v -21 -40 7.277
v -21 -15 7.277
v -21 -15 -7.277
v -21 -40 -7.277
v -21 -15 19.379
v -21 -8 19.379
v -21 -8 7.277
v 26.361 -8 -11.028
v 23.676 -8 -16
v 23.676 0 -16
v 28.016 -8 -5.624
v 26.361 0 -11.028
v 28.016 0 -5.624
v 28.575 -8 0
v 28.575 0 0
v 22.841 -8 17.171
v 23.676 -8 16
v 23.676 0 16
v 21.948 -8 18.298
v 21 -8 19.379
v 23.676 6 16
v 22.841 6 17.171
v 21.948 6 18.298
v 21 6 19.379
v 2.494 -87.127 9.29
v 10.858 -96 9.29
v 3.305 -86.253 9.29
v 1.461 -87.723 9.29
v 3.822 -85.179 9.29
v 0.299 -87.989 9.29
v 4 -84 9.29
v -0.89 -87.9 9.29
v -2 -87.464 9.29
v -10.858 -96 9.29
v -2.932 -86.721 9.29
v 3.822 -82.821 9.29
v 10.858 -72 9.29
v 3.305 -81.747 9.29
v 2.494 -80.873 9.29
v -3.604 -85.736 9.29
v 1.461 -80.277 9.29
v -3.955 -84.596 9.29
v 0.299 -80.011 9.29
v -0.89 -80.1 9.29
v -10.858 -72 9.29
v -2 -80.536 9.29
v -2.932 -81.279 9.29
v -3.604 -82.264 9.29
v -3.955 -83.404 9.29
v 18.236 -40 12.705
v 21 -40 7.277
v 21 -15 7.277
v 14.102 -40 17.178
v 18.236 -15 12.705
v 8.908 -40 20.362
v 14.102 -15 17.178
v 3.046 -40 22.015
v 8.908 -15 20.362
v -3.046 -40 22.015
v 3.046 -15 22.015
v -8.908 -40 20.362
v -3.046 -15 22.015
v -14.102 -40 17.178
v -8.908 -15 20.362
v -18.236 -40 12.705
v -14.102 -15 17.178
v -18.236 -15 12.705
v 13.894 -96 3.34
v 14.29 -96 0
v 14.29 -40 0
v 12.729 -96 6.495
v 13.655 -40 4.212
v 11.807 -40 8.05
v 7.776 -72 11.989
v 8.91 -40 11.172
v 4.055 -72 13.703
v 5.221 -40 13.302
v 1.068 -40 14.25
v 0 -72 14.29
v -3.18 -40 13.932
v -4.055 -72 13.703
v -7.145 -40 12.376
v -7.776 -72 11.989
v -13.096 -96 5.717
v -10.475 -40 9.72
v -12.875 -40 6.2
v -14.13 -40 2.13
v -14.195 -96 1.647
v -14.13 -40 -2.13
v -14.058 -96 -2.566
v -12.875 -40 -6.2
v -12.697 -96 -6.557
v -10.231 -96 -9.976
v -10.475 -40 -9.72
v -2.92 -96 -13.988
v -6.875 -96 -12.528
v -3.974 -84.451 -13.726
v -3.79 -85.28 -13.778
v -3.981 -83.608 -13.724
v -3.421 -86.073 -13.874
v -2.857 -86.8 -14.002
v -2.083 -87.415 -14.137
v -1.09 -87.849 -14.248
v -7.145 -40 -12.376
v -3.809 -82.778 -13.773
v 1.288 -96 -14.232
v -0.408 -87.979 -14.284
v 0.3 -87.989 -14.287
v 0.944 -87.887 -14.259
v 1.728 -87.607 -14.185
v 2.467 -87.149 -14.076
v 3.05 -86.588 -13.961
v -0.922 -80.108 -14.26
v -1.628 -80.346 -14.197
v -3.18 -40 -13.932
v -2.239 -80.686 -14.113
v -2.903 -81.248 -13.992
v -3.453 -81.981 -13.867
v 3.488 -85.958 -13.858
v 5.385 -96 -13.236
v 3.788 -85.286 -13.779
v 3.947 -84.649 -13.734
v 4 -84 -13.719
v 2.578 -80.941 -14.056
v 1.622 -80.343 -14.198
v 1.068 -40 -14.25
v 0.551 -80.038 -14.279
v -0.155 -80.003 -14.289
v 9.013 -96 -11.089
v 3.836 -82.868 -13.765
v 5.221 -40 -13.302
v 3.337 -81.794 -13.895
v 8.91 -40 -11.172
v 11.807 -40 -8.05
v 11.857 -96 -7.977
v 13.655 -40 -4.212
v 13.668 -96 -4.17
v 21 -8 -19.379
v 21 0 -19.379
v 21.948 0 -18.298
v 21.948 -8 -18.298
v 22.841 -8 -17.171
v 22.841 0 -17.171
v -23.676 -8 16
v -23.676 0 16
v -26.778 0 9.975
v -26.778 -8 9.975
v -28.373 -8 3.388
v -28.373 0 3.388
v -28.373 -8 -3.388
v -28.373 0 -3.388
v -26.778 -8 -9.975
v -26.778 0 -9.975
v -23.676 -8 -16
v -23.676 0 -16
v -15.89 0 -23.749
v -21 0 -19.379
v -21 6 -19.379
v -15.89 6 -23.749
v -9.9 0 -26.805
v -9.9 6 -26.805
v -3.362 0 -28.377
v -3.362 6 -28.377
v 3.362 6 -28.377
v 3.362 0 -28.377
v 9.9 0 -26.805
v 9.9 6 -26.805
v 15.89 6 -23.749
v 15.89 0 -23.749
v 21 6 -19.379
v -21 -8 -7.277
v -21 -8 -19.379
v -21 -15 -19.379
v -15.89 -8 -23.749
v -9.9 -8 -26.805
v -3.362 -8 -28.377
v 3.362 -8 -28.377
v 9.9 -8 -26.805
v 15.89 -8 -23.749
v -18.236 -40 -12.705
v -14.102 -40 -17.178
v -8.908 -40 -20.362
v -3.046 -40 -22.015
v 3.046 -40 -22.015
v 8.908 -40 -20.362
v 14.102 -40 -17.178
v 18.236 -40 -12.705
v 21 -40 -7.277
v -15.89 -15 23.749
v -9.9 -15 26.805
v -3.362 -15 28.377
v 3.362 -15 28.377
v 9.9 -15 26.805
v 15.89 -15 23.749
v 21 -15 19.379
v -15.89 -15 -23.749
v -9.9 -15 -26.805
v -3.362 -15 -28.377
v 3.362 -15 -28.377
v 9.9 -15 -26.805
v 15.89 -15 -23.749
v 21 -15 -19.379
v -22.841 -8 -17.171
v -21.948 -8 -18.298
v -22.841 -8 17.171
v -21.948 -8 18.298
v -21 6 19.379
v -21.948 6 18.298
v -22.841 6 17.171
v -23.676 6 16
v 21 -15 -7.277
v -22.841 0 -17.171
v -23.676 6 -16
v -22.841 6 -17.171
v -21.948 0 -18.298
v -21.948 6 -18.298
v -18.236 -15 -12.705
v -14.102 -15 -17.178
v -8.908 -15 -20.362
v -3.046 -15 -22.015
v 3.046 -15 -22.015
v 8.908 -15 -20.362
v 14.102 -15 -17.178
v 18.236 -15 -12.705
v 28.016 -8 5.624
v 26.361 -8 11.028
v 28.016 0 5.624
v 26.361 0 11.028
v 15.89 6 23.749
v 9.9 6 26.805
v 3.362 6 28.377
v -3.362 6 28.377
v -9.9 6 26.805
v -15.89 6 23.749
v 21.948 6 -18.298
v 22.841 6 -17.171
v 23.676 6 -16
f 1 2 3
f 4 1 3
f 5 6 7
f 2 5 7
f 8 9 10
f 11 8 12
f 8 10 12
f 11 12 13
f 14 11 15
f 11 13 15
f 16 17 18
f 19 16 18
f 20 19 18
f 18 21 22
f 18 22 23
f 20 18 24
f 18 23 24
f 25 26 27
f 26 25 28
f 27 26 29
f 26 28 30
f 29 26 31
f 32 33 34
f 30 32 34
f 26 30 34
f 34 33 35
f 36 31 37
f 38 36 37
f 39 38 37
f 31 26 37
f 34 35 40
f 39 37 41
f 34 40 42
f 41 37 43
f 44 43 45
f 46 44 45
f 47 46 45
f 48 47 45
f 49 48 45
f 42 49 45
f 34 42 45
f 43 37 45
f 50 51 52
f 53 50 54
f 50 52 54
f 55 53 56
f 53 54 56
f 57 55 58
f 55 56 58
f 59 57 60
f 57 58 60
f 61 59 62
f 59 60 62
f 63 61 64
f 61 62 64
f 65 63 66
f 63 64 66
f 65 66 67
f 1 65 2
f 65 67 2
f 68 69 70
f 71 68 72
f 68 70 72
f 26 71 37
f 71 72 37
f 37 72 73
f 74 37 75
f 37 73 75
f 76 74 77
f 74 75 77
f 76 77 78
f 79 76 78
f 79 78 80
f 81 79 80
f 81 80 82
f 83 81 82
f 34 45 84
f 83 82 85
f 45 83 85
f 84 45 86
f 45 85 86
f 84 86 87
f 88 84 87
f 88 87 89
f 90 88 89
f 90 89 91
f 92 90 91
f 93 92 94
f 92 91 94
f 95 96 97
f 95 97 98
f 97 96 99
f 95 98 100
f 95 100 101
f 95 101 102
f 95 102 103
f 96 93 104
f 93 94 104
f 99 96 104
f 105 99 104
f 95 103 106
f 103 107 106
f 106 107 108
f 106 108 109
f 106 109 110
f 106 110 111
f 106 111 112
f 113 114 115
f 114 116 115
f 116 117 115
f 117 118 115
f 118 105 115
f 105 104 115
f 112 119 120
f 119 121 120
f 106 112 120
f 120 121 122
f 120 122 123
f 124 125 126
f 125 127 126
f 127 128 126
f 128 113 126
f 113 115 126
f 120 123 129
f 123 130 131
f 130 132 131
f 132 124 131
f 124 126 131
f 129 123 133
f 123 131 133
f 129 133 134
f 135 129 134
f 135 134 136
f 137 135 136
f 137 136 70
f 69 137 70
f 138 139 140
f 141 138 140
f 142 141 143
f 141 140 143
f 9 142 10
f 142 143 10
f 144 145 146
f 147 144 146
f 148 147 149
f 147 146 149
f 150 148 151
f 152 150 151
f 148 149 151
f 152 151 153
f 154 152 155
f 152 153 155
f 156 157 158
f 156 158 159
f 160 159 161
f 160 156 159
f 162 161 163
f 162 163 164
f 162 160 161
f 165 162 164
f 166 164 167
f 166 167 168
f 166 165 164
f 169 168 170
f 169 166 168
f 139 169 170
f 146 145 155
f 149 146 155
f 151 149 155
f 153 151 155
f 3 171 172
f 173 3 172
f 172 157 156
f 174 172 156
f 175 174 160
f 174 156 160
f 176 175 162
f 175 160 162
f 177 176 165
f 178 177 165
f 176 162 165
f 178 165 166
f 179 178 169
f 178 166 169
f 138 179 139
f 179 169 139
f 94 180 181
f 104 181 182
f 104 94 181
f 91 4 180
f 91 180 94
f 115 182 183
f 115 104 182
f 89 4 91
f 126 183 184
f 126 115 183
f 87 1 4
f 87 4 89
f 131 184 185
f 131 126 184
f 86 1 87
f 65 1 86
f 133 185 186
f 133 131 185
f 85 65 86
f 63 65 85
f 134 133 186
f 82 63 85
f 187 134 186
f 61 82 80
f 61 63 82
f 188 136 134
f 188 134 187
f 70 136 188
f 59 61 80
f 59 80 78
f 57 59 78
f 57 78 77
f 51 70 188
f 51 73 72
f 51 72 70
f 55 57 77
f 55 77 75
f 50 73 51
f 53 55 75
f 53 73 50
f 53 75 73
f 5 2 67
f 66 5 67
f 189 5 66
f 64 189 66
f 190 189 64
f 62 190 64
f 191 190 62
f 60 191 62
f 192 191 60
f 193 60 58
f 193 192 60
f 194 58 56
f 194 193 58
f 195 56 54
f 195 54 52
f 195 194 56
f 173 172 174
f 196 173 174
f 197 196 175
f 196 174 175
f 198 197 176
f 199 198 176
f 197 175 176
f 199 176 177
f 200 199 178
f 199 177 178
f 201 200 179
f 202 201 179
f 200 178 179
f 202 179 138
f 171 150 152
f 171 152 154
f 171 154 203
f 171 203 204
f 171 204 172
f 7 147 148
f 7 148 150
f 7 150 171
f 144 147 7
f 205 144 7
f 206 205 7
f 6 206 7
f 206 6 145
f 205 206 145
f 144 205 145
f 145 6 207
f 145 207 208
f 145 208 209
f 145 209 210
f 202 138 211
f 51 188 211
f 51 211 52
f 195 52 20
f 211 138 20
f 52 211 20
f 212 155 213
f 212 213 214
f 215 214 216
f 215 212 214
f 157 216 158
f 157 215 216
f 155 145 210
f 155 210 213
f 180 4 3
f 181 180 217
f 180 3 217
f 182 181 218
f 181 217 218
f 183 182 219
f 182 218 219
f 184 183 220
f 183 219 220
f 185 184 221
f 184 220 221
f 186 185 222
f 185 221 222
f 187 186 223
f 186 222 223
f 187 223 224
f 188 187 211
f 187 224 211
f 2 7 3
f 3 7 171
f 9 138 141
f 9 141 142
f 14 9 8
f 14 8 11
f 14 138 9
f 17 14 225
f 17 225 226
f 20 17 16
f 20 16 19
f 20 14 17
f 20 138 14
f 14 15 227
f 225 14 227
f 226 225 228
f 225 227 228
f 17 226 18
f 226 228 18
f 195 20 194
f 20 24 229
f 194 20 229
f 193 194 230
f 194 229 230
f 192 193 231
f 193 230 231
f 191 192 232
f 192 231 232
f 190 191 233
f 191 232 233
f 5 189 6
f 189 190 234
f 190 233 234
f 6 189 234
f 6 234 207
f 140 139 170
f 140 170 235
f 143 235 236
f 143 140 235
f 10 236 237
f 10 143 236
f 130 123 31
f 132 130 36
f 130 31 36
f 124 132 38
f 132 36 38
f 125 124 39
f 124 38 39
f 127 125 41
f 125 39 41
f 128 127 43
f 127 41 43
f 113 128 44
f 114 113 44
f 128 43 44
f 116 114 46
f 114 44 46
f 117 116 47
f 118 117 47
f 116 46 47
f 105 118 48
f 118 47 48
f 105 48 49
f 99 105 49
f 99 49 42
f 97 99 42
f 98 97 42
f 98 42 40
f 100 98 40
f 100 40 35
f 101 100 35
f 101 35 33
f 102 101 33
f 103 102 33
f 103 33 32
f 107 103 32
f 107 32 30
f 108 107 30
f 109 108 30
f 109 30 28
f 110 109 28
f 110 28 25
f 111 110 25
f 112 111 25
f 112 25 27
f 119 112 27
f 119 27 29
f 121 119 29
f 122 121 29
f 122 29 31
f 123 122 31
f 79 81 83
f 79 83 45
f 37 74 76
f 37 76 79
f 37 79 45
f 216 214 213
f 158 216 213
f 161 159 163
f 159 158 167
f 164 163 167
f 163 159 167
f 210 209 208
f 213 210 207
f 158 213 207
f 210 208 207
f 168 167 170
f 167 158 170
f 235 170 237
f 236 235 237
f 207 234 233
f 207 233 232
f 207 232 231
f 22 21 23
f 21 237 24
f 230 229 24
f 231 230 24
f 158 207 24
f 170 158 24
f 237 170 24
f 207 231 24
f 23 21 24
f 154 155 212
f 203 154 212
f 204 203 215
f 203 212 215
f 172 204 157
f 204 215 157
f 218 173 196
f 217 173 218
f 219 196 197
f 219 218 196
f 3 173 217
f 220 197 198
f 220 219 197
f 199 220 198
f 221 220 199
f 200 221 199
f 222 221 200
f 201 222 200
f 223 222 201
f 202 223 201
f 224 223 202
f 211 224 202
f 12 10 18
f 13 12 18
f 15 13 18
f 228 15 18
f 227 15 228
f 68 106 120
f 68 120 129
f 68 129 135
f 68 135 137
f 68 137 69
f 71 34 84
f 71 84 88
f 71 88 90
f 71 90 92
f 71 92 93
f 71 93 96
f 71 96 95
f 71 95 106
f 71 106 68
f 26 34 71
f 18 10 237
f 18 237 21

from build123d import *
from build123d import SkipClean  # not in build123d's __all__

# Parameters (mm, degrees)
F1_DEPTH = 6
F2_DEPTH = 8
F3_DEPTH = 15
F4_DEPTH = 72
F5_DEPTH = 96
F6_DEPTH = 40
F7_R     = 4
F8_DEPTH = 25


# Not quite as in the source:
# - after a boolean that leaves OpenCascade's solid faulty, fix() repairs it


with BuildPart() as f1:
    # F0 (on Front) → F1 (new body)
    with BuildSketch(Plane.XZ):
        with BuildLine():
            Line((-21, 7.2767180102), (-21, 19.3786125664))
            ThreePointArc((-21, 19.3786125664), (-22.4015502975, 17.7398187497), (-23.6755279772, 16))
            Line((-23.6755279772, 16), (-23.6755279772, -16))
            ThreePointArc((-23.6755279772, -16), (-22.4015502975, -17.7398187497), (-21, -19.3786125664))
            Line((-21, -19.3786125664), (-21, -7.2767180102))
            ThreePointArc((-21, -7.2767180102), (-22.225, 0), (-21, 7.2767180102))
        make_face()
        with BuildLine():
            Line((-21, -7.2767180102), (-21, 7.2767180102))
            ThreePointArc((-21, 7.2767180102), (-22.225, 0), (-21, -7.2767180102))
        make_face()
        with BuildLine():
            Line((21, 7.2767180102), (21, 19.3786125664))
            ThreePointArc((21, 19.3786125664), (0, 28.575), (-21, 19.3786125664))
            Line((-21, 19.3786125664), (-21, 7.2767180102))
            ThreePointArc((-21, 7.2767180102), (0, 22.225), (21, 7.2767180102))
        make_face()
        with BuildLine():
            Line((21, -7.2767180102), (21, 7.2767180102))
            ThreePointArc((21, 7.2767180102), (0, 22.225), (-21, 7.2767180102))
            Line((-21, 7.2767180102), (-21, -7.2767180102))
            ThreePointArc((-21, -7.2767180102), (0, -22.225), (21, -7.2767180102))
        make_face()
        with BuildLine():
            ThreePointArc((10.8581766425, 9.29), (13.4046157017, 4.9518055181), (14.29, 0))
            ThreePointArc((14.29, 0), (-4.9518055181, -13.4046157017), (-10.8581766425, 9.29))
            ThreePointArc((-10.8581766425, 9.29), (0, 14.29), (10.8581766425, 9.29))
        make_face(mode=Mode.SUBTRACT)
        with BuildLine():
            ThreePointArc((-21, -19.3786125664), (0, -28.575), (21, -19.3786125664))
            Line((21, -19.3786125664), (21, -7.2767180102))
            ThreePointArc((21, -7.2767180102), (0, -22.225), (-21, -7.2767180102))
            Line((-21, -7.2767180102), (-21, -19.3786125664))
        make_face()
        with BuildLine():
            ThreePointArc((22.225, 0), (21.9166104245, 3.6895545124), (21, 7.2767180102))
            Line((21, 7.2767180102), (21, -7.2767180102))
            ThreePointArc((21, -7.2767180102), (21.9166104245, -3.6895545124), (22.225, 0))
        make_face()
        with BuildLine():
            Line((23.6755279772, -16), (23.6755279772, 16))
            ThreePointArc((23.6755279772, 16), (22.4015502975, 17.7398187497), (21, 19.3786125664))
            Line((21, 19.3786125664), (21, 7.2767180102))
            ThreePointArc((21, 7.2767180102), (21.9166104245, 3.6895545124), (22.225, 0))
            ThreePointArc((22.225, 0), (21.9166104245, -3.6895545124), (21, -7.2767180102))
            Line((21, -7.2767180102), (21, -19.3786125664))
            ThreePointArc((21, -19.3786125664), (22.4015502975, -17.7398187497), (23.6755279772, -16))
        make_face()
        with BuildLine():
            ThreePointArc((-10.8581766425, 9.29), (-4.9518055181, -13.4046157017), (14.29, 0))
            ThreePointArc((14.29, 0), (13.4046157017, 4.9518055181), (10.8581766425, 9.29))
            Line((10.8581766425, 9.29), (-10.8581766425, 9.29))
        make_face()
        with BuildLine():
            Line((-10.8581766425, 9.29), (10.8581766425, 9.29))
            ThreePointArc((10.8581766425, 9.29), (0, 14.29), (-10.8581766425, 9.29))
        make_face()
    extrude(amount=-F1_DEPTH)

    # F0 (on Front) → F2 (join)
    with BuildSketch(Plane.XZ):
        with BuildLine():
            Line((21, -7.2767180102), (21, 7.2767180102))
            ThreePointArc((21, 7.2767180102), (0, 22.225), (-21, 7.2767180102))
            Line((-21, 7.2767180102), (-21, -7.2767180102))
            ThreePointArc((-21, -7.2767180102), (0, -22.225), (21, -7.2767180102))
        make_face()
        with BuildLine():
            ThreePointArc((10.8581766425, 9.29), (13.4046157017, 4.9518055181), (14.29, 0))
            ThreePointArc((14.29, 0), (-4.9518055181, -13.4046157017), (-10.8581766425, 9.29))
            ThreePointArc((-10.8581766425, 9.29), (0, 14.29), (10.8581766425, 9.29))
        make_face(mode=Mode.SUBTRACT)
        with BuildLine():
            ThreePointArc((-10.8581766425, 9.29), (-4.9518055181, -13.4046157017), (14.29, 0))
            ThreePointArc((14.29, 0), (13.4046157017, 4.9518055181), (10.8581766425, 9.29))
            Line((10.8581766425, 9.29), (-10.8581766425, 9.29))
        make_face()
        with BuildLine():
            Line((21, 7.2767180102), (21, 19.3786125664))
            ThreePointArc((21, 19.3786125664), (0, 28.575), (-21, 19.3786125664))
            Line((-21, 19.3786125664), (-21, 7.2767180102))
            ThreePointArc((-21, 7.2767180102), (0, 22.225), (21, 7.2767180102))
        make_face()
        with BuildLine():
            ThreePointArc((-21, -19.3786125664), (0, -28.575), (21, -19.3786125664))
            Line((21, -19.3786125664), (21, -7.2767180102))
            ThreePointArc((21, -7.2767180102), (0, -22.225), (-21, -7.2767180102))
            Line((-21, -7.2767180102), (-21, -19.3786125664))
        make_face()
        with BuildLine():
            ThreePointArc((23.6755279772, -16), (27.3226905424, -8.3666723687), (28.575, 0))
            ThreePointArc((28.575, 0), (27.3226905424, 8.3666723687), (23.6755279772, 16))
            Line((23.6755279772, 16), (23.6755279772, -16))
        make_face()
        with BuildLine():
            Line((-23.6755279772, -16), (-23.6755279772, 16))
            ThreePointArc((-23.6755279772, 16), (-28.575, 0), (-23.6755279772, -16))
        make_face()
        with BuildLine():
            Line((23.6755279772, -16), (23.6755279772, 16))
            ThreePointArc((23.6755279772, 16), (22.4015502975, 17.7398187497), (21, 19.3786125664))
            Line((21, 19.3786125664), (21, 7.2767180102))
            ThreePointArc((21, 7.2767180102), (21.9166104245, 3.6895545124), (22.225, 0))
            ThreePointArc((22.225, 0), (21.9166104245, -3.6895545124), (21, -7.2767180102))
            Line((21, -7.2767180102), (21, -19.3786125664))
            ThreePointArc((21, -19.3786125664), (22.4015502975, -17.7398187497), (23.6755279772, -16))
        make_face()
        with BuildLine():
            Line((-21, 7.2767180102), (-21, 19.3786125664))
            ThreePointArc((-21, 19.3786125664), (-22.4015502975, 17.7398187497), (-23.6755279772, 16))
            Line((-23.6755279772, 16), (-23.6755279772, -16))
            ThreePointArc((-23.6755279772, -16), (-22.4015502975, -17.7398187497), (-21, -19.3786125664))
            Line((-21, -19.3786125664), (-21, -7.2767180102))
            ThreePointArc((-21, -7.2767180102), (-22.225, 0), (-21, 7.2767180102))
        make_face()
        with BuildLine():
            Line((-10.8581766425, 9.29), (10.8581766425, 9.29))
            ThreePointArc((10.8581766425, 9.29), (0, 14.29), (-10.8581766425, 9.29))
        make_face()
        with BuildLine():
            Line((-21, -7.2767180102), (-21, 7.2767180102))
            ThreePointArc((-21, 7.2767180102), (-22.225, 0), (-21, -7.2767180102))
        make_face()
        with BuildLine():
            ThreePointArc((22.225, 0), (21.9166104245, 3.6895545124), (21, 7.2767180102))
            Line((21, 7.2767180102), (21, -7.2767180102))
            ThreePointArc((21, -7.2767180102), (21.9166104245, -3.6895545124), (22.225, 0))
        make_face()
    with SkipClean():  # cleaning this boolean's faces spoils the solid; the shape is the same uncleaned
        extrude(amount=F2_DEPTH)

    # F0 (on Front) → F3 (join)
    with BuildSketch(Plane.XZ):
        with BuildLine():
            Line((21, -7.2767180102), (21, 7.2767180102))
            ThreePointArc((21, 7.2767180102), (0, 22.225), (-21, 7.2767180102))
            Line((-21, 7.2767180102), (-21, -7.2767180102))
            ThreePointArc((-21, -7.2767180102), (0, -22.225), (21, -7.2767180102))
        make_face()
        with BuildLine():
            ThreePointArc((10.8581766425, 9.29), (13.4046157017, 4.9518055181), (14.29, 0))
            ThreePointArc((14.29, 0), (-4.9518055181, -13.4046157017), (-10.8581766425, 9.29))
            ThreePointArc((-10.8581766425, 9.29), (0, 14.29), (10.8581766425, 9.29))
        make_face(mode=Mode.SUBTRACT)
        with BuildLine():
            ThreePointArc((-10.8581766425, 9.29), (-4.9518055181, -13.4046157017), (14.29, 0))
            ThreePointArc((14.29, 0), (13.4046157017, 4.9518055181), (10.8581766425, 9.29))
            Line((10.8581766425, 9.29), (-10.8581766425, 9.29))
        make_face()
        with BuildLine():
            Line((21, 7.2767180102), (21, 19.3786125664))
            ThreePointArc((21, 19.3786125664), (0, 28.575), (-21, 19.3786125664))
            Line((-21, 19.3786125664), (-21, 7.2767180102))
            ThreePointArc((-21, 7.2767180102), (0, 22.225), (21, 7.2767180102))
        make_face()
        with BuildLine():
            ThreePointArc((-21, -19.3786125664), (0, -28.575), (21, -19.3786125664))
            Line((21, -19.3786125664), (21, -7.2767180102))
            ThreePointArc((21, -7.2767180102), (0, -22.225), (-21, -7.2767180102))
            Line((-21, -7.2767180102), (-21, -19.3786125664))
        make_face()
        with BuildLine():
            Line((-10.8581766425, 9.29), (10.8581766425, 9.29))
            ThreePointArc((10.8581766425, 9.29), (0, 14.29), (-10.8581766425, 9.29))
        make_face()
    extrude(amount=F3_DEPTH)

    add(f1.part.fix(), mode=Mode.REPLACE)

    # F0 (on Front) → F4 (join)
    with BuildSketch(Plane.XZ):
        with BuildLine():
            ThreePointArc((-10.8581766425, 9.29), (-4.9518055181, -13.4046157017), (14.29, 0))
            ThreePointArc((14.29, 0), (13.4046157017, 4.9518055181), (10.8581766425, 9.29))
            Line((10.8581766425, 9.29), (-10.8581766425, 9.29))
        make_face()
        with BuildLine():
            Line((-10.8581766425, 9.29), (10.8581766425, 9.29))
            ThreePointArc((10.8581766425, 9.29), (0, 14.29), (-10.8581766425, 9.29))
        make_face()
    extrude(amount=F4_DEPTH)

    # F0 (on Front) → F5 (join)
    with BuildSketch(Plane.XZ):
        with BuildLine():
            ThreePointArc((-10.8581766425, 9.29), (-4.9518055181, -13.4046157017), (14.29, 0))
            ThreePointArc((14.29, 0), (13.4046157017, 4.9518055181), (10.8581766425, 9.29))
            Line((10.8581766425, 9.29), (-10.8581766425, 9.29))
        make_face()
    extrude(amount=F5_DEPTH)

    # F0 (on Front) → F6 (join)
    with BuildSketch(Plane.XZ):
        with BuildLine():
            Line((21, -7.2767180102), (21, 7.2767180102))
            ThreePointArc((21, 7.2767180102), (0, 22.225), (-21, 7.2767180102))
            Line((-21, 7.2767180102), (-21, -7.2767180102))
            ThreePointArc((-21, -7.2767180102), (0, -22.225), (21, -7.2767180102))
        make_face()
        with BuildLine():
            ThreePointArc((10.8581766425, 9.29), (13.4046157017, 4.9518055181), (14.29, 0))
            ThreePointArc((14.29, 0), (-4.9518055181, -13.4046157017), (-10.8581766425, 9.29))
            ThreePointArc((-10.8581766425, 9.29), (0, 14.29), (10.8581766425, 9.29))
        make_face(mode=Mode.SUBTRACT)
        with BuildLine():
            ThreePointArc((-10.8581766425, 9.29), (-4.9518055181, -13.4046157017), (14.29, 0))
            ThreePointArc((14.29, 0), (13.4046157017, 4.9518055181), (10.8581766425, 9.29))
            Line((10.8581766425, 9.29), (-10.8581766425, 9.29))
        make_face()
        with BuildLine():
            Line((-10.8581766425, 9.29), (10.8581766425, 9.29))
            ThreePointArc((10.8581766425, 9.29), (0, 14.29), (-10.8581766425, 9.29))
        make_face()
    extrude(amount=F6_DEPTH)

    # F7 (on face) → F8 (cut)
    with BuildSketch(Plane.XY.offset(9.29)):
        with Locations((0, -84)):
            Circle(F7_R)
    extrude(amount=-F8_DEPTH, mode=Mode.SUBTRACT)


solid = f1.part
